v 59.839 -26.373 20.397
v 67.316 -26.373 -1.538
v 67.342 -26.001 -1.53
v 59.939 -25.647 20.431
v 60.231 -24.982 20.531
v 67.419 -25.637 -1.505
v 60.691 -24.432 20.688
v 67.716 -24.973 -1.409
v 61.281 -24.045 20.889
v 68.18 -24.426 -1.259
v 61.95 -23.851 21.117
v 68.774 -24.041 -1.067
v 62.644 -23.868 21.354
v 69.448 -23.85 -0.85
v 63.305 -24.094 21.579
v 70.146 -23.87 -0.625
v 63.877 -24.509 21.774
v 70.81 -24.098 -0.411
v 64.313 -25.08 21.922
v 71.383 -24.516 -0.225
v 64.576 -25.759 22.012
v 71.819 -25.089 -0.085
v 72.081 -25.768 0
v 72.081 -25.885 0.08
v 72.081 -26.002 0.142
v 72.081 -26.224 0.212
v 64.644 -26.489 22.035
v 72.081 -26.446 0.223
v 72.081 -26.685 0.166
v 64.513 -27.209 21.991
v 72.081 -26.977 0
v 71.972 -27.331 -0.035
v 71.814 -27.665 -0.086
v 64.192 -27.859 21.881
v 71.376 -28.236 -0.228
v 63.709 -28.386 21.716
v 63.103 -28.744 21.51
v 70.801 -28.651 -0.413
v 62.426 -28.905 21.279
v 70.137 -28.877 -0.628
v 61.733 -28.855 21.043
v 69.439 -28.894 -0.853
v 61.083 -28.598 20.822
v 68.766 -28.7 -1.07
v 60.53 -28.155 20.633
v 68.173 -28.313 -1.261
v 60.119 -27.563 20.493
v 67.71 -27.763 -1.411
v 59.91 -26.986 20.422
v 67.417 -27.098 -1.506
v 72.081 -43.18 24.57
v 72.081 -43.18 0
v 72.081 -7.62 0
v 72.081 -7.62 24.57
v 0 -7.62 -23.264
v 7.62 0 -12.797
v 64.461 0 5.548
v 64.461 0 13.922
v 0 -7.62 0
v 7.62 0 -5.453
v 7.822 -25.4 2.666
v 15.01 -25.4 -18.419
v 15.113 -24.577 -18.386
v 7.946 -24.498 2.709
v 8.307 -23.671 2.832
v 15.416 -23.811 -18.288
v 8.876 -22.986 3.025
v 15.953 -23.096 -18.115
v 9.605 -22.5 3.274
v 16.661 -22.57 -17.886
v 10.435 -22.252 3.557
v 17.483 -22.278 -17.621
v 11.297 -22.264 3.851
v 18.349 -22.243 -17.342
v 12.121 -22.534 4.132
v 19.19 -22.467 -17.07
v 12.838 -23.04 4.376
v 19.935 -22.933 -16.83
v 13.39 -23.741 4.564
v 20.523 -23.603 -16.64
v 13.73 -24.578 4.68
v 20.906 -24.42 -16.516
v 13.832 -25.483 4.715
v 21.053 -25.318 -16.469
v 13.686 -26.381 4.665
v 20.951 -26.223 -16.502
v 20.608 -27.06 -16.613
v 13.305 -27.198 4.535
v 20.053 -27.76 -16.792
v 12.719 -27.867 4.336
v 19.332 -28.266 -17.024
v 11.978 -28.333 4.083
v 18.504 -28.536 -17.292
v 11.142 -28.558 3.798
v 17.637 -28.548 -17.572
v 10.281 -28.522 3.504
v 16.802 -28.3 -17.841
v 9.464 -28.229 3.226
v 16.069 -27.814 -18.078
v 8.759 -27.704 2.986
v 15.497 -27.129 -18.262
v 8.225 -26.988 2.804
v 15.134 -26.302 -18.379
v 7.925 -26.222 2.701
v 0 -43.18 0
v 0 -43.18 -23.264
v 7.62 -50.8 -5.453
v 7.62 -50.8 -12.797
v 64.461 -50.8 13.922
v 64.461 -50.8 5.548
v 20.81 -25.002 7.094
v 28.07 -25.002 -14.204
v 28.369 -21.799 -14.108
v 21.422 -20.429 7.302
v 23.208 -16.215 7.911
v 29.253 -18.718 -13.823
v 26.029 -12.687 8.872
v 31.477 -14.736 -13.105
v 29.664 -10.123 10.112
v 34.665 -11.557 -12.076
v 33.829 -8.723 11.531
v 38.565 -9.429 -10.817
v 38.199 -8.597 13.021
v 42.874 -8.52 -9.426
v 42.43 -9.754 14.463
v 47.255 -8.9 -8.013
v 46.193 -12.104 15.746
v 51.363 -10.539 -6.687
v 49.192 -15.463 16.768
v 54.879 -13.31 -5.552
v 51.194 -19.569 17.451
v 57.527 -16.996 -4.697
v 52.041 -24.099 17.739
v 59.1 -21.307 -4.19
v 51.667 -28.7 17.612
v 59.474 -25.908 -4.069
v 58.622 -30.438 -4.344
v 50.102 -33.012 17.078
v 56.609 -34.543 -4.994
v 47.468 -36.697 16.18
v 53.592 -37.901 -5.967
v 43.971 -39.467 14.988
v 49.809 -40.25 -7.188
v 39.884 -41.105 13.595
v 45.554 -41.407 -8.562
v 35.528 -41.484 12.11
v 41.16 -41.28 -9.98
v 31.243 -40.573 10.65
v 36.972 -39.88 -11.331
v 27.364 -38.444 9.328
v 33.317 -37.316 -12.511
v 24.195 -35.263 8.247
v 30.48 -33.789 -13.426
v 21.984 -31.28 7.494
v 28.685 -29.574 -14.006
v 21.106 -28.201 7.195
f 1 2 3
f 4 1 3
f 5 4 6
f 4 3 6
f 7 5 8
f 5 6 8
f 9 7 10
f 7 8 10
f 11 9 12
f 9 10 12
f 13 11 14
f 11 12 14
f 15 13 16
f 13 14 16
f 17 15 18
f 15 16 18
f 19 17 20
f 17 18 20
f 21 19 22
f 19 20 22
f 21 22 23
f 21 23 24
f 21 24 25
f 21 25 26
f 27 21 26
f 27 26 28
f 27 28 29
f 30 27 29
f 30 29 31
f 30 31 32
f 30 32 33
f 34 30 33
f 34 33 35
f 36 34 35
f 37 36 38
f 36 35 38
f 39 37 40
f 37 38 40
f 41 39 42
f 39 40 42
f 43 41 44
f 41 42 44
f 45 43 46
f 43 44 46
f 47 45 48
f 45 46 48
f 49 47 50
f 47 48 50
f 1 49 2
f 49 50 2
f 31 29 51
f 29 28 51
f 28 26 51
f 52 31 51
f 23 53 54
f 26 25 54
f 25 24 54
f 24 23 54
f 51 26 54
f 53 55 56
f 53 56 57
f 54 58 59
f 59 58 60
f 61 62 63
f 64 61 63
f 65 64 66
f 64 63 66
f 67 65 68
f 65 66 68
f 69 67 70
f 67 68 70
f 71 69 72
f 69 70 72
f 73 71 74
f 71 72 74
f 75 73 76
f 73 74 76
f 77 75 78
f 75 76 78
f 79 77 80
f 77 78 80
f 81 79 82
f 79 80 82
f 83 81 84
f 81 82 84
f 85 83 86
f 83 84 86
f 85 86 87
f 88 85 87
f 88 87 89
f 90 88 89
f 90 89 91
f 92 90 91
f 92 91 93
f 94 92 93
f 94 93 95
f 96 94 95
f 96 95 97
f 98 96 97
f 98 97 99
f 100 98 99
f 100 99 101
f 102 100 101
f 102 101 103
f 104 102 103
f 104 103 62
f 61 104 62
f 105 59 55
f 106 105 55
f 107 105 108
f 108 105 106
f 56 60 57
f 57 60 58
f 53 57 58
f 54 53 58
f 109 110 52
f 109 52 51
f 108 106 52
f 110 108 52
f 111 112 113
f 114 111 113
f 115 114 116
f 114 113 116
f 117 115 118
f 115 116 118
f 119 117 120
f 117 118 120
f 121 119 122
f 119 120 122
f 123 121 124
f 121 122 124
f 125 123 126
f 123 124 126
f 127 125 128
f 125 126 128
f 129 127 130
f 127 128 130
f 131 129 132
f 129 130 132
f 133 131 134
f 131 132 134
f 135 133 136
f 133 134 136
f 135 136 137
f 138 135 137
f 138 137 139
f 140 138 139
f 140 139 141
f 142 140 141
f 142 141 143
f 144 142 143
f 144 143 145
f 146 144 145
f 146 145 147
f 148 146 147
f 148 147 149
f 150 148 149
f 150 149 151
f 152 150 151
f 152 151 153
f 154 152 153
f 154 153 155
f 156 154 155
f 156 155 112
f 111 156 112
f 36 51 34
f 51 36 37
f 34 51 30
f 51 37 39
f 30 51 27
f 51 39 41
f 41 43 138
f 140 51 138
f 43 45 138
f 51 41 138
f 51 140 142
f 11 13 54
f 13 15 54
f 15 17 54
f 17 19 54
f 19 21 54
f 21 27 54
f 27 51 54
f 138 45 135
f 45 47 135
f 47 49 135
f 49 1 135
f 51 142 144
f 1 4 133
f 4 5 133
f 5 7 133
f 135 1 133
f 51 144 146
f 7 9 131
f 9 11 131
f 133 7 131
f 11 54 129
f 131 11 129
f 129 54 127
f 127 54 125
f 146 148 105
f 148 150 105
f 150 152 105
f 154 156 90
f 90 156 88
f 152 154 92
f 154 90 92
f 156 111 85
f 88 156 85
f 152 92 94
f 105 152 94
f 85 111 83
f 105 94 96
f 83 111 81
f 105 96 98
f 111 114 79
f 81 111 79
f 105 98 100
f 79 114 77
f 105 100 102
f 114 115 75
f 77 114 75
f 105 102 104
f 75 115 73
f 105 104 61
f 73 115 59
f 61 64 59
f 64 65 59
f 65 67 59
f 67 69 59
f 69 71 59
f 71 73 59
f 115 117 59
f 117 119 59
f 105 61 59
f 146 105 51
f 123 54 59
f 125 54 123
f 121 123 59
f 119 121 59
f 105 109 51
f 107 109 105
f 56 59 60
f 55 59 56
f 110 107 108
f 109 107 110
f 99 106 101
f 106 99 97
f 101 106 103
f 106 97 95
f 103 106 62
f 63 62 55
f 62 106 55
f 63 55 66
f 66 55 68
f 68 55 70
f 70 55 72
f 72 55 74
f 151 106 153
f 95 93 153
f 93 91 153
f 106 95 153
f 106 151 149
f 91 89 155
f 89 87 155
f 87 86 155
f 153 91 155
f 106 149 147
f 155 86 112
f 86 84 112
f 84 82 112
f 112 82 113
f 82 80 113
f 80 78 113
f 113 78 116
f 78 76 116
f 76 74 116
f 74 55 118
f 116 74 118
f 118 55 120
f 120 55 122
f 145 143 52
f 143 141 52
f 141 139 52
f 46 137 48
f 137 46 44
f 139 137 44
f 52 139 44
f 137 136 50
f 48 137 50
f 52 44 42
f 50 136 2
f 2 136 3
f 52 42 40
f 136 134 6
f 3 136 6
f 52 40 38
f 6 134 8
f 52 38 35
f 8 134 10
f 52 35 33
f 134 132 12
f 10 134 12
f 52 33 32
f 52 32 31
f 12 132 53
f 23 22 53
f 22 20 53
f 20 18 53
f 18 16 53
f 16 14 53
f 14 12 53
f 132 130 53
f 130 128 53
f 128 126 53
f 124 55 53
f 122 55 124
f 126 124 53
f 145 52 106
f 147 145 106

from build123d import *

# Parameters (mm, degrees)
F1_DEPTH = 50.8
F3_D     = 33.02
F4_SIZE  = 7.62
F5_SIZE  = 7.62
F7_D     = 5.08
F9_D     = 6.35


with BuildPart() as f1:
    # F0 (on Front) → F1 (new body)
    with BuildSketch(Plane.XZ):
        Polygon((72.081462, 24.570465), (0, 0), (0, -23.26379), (72.081462, 0), align=None)
    extrude(amount=F1_DEPTH)

    # F3 (through all)
    with Locations(Plane(origin=(0, 0, 0), x_dir=(0.946521, 0, 0.322641), z_dir=(-0.322641, 0, 0.946521))):
        with Locations((38.495995, -25.001924)):
            Hole(F3_D / 2)

    # F4
    f4_edges = [f1.edges().sort_by_distance(p)[0] for p in [
        (36.040731, -50.8, -11.631895),
        (72.081462, -50.8, 12.285233),
        (36.040731, -50.8, 12.285233),
        (0, -50.8, -11.631895),
    ]]
    chamfer(f4_edges, length=F4_SIZE)

    # F5
    f5_edges = [f1.edges().sort_by_distance(p)[0] for p in [
        (36.040731, 0, -11.631895),
        (72.081462, 0, 12.285233),
        (36.040731, 0, 12.285233),
        (0, 0, -11.631895),
    ]]
    chamfer(f5_edges, length=F5_SIZE)

    # F7 (through all)
    with Locations(Plane(origin=(0, 0, 0), x_dir=(0.946521, 0, 0.322641), z_dir=(-0.322641, 0, 0.946521))):
        with Locations((65.759569, -26.372515)):
            Hole(F7_D / 2)

    # F9 (through all)
    with Locations(Plane(origin=(0, 0, 0), x_dir=(0.946521, 0, 0.322641), z_dir=(-0.322641, 0, 0.946521))):
        with Locations((11.439297, -25.4)):
            Hole(F9_D / 2)


solid = f1.part
